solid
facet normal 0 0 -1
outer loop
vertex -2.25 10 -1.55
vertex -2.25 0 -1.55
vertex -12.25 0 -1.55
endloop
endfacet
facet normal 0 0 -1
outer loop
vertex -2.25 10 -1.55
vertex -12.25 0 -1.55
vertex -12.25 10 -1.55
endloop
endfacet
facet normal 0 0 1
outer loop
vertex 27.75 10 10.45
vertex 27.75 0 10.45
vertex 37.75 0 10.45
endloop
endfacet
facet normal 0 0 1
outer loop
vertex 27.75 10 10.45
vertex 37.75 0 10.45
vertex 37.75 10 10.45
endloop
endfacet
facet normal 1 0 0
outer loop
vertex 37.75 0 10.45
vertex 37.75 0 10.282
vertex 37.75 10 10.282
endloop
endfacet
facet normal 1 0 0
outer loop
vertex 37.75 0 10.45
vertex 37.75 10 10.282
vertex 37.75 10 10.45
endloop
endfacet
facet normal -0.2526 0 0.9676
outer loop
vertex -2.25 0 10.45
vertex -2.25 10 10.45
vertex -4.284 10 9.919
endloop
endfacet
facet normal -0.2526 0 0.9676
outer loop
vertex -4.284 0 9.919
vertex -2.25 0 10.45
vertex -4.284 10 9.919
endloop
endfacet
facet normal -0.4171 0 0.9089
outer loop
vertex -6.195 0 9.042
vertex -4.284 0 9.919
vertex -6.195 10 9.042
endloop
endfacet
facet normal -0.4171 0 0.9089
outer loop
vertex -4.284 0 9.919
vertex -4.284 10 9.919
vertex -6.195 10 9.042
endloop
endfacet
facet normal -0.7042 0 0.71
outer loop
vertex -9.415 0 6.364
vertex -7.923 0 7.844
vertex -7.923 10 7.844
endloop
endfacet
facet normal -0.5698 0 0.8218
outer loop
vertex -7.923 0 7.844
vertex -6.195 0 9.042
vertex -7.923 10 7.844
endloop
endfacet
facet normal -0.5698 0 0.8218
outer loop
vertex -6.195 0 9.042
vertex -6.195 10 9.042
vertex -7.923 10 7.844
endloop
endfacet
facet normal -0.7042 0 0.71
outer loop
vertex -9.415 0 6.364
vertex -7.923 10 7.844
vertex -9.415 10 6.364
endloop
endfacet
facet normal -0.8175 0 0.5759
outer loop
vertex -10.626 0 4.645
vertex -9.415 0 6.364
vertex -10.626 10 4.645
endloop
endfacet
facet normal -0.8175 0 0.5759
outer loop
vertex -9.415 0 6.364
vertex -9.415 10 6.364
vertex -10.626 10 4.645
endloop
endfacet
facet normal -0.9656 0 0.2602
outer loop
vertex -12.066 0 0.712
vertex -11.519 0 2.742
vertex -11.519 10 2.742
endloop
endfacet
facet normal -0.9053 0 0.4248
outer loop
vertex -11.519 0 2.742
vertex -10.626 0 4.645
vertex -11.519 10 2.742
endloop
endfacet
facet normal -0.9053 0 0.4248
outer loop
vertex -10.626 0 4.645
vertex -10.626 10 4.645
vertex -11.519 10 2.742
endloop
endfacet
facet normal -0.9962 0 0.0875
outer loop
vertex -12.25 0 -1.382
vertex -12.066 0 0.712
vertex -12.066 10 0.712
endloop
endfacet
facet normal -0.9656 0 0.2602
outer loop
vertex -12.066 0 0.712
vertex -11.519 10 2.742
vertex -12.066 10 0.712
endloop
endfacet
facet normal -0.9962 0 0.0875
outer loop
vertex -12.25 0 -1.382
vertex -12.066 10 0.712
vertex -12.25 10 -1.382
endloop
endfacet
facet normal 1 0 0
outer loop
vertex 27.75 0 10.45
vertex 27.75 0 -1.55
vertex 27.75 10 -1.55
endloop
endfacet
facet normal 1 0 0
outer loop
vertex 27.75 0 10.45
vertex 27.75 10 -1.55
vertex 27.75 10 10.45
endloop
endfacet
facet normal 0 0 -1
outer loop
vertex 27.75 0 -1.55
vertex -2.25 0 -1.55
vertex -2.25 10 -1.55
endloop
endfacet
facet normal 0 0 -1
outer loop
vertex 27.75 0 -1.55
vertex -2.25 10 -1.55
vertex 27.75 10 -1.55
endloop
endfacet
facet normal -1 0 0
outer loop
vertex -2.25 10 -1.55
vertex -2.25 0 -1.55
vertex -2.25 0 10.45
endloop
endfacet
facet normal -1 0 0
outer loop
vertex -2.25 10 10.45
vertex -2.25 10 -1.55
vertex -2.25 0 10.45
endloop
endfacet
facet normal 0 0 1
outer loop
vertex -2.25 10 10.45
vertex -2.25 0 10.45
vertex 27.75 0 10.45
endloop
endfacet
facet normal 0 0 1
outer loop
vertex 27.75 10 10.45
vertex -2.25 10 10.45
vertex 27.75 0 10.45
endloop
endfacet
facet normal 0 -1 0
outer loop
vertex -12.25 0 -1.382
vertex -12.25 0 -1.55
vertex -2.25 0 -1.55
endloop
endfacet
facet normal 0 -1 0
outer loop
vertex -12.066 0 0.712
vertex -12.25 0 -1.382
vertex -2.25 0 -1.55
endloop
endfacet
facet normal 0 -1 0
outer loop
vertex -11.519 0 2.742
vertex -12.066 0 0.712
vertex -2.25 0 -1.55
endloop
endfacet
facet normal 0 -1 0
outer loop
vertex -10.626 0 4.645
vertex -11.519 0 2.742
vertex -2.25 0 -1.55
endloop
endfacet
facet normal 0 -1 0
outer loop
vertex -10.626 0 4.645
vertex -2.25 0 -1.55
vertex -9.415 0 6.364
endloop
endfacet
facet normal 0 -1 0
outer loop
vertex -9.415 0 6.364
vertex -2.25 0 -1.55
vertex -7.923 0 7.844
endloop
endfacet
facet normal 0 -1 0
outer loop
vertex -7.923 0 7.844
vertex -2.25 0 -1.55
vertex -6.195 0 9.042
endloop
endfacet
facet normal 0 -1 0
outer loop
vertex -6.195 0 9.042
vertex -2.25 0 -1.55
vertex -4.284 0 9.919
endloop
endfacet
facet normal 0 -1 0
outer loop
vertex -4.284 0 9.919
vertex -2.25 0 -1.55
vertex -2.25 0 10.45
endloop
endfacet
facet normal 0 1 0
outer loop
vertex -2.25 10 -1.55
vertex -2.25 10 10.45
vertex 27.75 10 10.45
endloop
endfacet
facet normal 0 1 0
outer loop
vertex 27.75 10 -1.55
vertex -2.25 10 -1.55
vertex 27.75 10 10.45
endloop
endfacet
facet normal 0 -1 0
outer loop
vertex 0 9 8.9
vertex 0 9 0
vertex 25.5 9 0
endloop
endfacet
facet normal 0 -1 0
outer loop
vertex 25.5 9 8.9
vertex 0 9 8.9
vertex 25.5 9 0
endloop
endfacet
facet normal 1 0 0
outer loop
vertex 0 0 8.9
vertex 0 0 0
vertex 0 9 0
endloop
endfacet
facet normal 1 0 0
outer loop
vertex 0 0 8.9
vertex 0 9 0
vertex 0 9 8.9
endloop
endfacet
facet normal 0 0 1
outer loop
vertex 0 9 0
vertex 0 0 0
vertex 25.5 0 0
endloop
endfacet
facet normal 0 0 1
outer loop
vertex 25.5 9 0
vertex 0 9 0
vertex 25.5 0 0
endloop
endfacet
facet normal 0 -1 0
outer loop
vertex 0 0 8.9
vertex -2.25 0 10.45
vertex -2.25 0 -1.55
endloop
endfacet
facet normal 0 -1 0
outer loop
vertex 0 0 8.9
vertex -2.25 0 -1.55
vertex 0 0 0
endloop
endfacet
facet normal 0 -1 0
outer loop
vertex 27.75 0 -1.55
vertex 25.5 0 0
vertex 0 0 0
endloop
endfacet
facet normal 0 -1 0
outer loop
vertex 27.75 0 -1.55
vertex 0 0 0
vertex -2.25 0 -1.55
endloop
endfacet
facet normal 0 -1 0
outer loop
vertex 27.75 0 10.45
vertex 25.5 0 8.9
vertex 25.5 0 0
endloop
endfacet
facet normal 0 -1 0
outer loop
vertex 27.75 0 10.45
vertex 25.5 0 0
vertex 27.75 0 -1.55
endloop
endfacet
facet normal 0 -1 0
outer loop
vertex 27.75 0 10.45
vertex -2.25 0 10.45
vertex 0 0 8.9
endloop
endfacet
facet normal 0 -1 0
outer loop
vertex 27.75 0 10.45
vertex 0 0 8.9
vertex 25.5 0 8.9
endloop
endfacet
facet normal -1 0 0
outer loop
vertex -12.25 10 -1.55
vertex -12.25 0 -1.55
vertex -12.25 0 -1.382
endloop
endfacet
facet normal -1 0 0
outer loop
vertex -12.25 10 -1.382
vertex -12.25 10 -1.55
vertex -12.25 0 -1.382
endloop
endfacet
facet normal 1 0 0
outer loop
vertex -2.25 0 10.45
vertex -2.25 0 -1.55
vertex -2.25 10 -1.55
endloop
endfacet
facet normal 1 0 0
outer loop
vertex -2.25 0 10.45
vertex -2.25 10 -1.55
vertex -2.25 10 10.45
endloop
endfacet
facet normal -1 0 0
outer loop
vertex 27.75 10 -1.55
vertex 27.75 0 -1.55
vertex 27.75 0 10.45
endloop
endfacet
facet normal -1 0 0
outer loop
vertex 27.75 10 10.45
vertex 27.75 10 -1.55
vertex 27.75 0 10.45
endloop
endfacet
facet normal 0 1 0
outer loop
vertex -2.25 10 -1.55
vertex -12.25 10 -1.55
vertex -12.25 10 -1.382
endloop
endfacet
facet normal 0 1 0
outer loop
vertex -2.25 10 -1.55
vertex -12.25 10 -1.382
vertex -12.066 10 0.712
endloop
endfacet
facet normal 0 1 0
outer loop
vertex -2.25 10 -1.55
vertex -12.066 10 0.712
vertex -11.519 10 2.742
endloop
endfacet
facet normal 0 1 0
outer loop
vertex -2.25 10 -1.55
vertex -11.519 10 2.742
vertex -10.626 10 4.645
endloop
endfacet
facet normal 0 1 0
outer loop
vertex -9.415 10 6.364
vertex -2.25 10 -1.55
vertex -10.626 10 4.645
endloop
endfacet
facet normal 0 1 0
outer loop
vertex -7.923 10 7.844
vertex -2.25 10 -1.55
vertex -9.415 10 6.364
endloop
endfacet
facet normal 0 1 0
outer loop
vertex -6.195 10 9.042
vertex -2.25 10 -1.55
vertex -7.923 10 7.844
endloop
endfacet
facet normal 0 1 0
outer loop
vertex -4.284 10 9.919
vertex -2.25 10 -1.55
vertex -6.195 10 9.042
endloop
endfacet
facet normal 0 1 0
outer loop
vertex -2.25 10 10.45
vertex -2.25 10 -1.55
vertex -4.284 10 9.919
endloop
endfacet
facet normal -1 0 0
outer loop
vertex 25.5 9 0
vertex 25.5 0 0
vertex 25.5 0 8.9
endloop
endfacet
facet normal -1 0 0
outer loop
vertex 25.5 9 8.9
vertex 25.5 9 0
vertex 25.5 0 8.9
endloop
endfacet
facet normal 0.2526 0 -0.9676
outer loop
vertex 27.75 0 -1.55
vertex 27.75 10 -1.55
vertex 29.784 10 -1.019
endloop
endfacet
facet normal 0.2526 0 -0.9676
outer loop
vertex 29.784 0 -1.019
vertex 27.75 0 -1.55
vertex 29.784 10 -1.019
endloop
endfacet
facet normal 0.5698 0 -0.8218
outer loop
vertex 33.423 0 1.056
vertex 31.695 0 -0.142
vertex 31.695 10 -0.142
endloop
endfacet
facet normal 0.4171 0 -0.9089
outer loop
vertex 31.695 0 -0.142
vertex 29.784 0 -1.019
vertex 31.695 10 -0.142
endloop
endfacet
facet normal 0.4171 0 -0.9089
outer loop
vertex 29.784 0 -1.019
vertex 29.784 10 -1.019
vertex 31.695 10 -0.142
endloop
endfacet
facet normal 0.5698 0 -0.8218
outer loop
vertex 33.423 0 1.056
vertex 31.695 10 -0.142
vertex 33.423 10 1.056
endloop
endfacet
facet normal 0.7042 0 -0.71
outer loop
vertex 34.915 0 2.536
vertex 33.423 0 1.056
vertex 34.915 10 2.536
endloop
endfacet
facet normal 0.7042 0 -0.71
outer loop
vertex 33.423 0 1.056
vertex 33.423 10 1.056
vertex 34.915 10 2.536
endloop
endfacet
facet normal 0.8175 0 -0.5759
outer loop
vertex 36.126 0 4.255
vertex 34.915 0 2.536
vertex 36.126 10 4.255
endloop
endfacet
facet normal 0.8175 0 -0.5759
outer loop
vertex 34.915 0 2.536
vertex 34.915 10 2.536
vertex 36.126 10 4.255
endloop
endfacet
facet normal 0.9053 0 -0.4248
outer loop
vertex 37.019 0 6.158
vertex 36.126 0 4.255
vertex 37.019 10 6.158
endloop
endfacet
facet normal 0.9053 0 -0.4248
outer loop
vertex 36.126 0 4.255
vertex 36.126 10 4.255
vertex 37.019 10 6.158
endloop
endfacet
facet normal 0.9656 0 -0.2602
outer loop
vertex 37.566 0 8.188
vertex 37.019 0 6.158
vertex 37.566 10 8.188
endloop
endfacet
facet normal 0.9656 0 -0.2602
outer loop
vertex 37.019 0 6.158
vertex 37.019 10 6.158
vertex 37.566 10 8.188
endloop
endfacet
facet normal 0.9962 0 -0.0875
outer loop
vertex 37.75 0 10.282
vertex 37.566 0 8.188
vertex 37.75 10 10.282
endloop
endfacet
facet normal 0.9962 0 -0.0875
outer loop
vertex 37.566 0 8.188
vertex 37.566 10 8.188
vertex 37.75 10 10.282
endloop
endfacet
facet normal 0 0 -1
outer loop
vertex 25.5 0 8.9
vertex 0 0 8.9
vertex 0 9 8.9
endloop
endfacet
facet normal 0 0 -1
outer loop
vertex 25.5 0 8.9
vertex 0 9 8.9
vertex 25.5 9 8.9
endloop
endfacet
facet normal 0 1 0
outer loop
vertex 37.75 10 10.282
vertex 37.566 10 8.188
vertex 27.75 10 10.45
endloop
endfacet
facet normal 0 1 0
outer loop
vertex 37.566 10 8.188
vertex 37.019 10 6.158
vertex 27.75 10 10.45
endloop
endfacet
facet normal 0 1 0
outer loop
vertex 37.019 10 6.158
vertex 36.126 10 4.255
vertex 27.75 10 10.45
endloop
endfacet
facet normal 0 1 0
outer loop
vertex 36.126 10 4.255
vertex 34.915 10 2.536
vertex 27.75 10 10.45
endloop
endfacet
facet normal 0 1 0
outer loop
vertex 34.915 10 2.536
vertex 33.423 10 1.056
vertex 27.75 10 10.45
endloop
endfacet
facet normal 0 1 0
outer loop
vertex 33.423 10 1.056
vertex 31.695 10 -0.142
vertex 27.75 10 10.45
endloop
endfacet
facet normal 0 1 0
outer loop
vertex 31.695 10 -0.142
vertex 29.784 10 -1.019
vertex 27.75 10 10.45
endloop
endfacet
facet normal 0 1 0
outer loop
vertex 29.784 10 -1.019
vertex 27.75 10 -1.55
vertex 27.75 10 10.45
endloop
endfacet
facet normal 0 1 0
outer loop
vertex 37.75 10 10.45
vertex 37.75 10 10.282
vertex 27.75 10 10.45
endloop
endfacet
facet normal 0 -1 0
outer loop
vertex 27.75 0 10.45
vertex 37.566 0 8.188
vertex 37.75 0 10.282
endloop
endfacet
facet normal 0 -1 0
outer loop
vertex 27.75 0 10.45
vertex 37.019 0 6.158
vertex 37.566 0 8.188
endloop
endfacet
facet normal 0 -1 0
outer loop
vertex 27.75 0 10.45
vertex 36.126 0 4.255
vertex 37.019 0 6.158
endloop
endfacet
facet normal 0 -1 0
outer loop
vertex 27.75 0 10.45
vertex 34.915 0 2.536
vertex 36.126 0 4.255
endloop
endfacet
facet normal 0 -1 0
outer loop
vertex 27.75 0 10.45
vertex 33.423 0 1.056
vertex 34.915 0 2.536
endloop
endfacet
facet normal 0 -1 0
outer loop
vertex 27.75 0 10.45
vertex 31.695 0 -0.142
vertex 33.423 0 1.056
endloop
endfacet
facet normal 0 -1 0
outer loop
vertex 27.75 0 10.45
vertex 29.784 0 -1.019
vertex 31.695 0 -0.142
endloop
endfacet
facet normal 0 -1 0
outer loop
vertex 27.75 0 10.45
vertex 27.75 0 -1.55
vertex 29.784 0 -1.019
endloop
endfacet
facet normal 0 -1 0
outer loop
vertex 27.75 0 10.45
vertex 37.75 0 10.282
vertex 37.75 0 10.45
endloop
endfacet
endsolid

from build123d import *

# Parameters (mm, degrees)
F0_W          = 25.5
F0_H          = 8.9
F1_DEPTH      = 8.9
F2_W          = 30
F2_H          = 12
F2_W_2        = 25.5
F2_H_2        = 8.9
F3_DEPTH      = 10
F4_DEPTH      = 9
F5_DEPTH      = 10
F6_DEPTH      = 10
F9_T1_DEPTH   = 69.160797831
F9_2_T1_DEPTH = 69.160797831


# Not quite as in the source:
# - a fillet or chamfer that OpenCascade refuses, or shapes differently, is made with other operations: its cross-section is extruded or revolved along the edge and cut away or added


with BuildPart() as f1:
    # F0 (on Top) → F1 (new body)
    with BuildSketch(Plane.XY):
        with Locations((12.75, 4.45)):
            Rectangle(F0_W, F0_H)
    extrude(amount=F1_DEPTH)


with BuildPart() as f3:
    # F2 (on face) → F3 (new body)
    with BuildSketch(Plane.XZ):
        with Locations((12.75, 4.45)):
            Rectangle(F2_W, F2_H)
        with Locations((12.75, 4.45)):
            Rectangle(F2_W_2, F2_H_2, mode=Mode.SUBTRACT)
        with Locations((12.75, 4.45)):
            Rectangle(F2_W_2, F2_H_2)
    extrude(amount=-F3_DEPTH)


with BuildPart() as f4_tool:
    # F4 (cut): a face of the model
    f4_faces = [f1.part.faces().sort_by_distance(p)[0] for p in [
        (12.75, 0, 4.45),
    ]]
    extrude(f4_faces, amount=-F4_DEPTH)


with BuildPart() as f1_1:
    add(f1.part)

    # F4: cut by f4_tool
    add(f4_tool.part, mode=Mode.SUBTRACT)


with BuildPart() as f3_1:
    add(f3.part)

    # F4: cut by f4_tool
    add(f4_tool.part, mode=Mode.SUBTRACT)


with BuildPart() as f5:
    # F5 (new): a face of the model
    f5_faces = [f3_1.part.faces().sort_by_distance(p)[0] for p in [
        (-2.25, 5, 4.45),
    ]]
    extrude(f5_faces, amount=F5_DEPTH)

    # F9: fillet of radius 12 on 1 edges, made by hand

    # F9_s2 → F9_t1 (cut)
    with BuildSketch(Plane.XZ.offset(-39.5803989155)):
        with BuildLine():
            ThreePointArc((-2.25, 10.45), (-9.4151513899, 6.3638071262), (-12.25, -1.3821595662))
            Line((-12.25, -1.3821595662), (-12.25, 10.45))
            Line((-12.25, 10.45), (-2.25, 10.45))
        make_face()
    extrude(amount=F9_T1_DEPTH, mode=Mode.SUBTRACT)


with BuildPart() as f6:
    # F6 (new): a face of the model
    f6_faces = [f3_1.part.faces().sort_by_distance(p)[0] for p in [
        (27.75, 5, 4.45),
    ]]
    extrude(f6_faces, amount=F6_DEPTH)

    # F9#2: fillet of radius 12 on 1 edges, made by hand

    # F9_2_s2 → F9_2_t1 (cut)
    with BuildSketch(Plane.XZ.offset(-39.5803989155)):
        with BuildLine():
            ThreePointArc((27.75, -1.55), (34.9151513899, 2.5361928738), (37.75, 10.2821595662))
            Line((37.75, 10.2821595662), (37.75, -1.55))
            Line((37.75, -1.55), (27.75, -1.55))
        make_face()
    extrude(amount=F9_2_T1_DEPTH, mode=Mode.SUBTRACT)


solid = Compound([f3_1.part, f5.part, f6.part])
